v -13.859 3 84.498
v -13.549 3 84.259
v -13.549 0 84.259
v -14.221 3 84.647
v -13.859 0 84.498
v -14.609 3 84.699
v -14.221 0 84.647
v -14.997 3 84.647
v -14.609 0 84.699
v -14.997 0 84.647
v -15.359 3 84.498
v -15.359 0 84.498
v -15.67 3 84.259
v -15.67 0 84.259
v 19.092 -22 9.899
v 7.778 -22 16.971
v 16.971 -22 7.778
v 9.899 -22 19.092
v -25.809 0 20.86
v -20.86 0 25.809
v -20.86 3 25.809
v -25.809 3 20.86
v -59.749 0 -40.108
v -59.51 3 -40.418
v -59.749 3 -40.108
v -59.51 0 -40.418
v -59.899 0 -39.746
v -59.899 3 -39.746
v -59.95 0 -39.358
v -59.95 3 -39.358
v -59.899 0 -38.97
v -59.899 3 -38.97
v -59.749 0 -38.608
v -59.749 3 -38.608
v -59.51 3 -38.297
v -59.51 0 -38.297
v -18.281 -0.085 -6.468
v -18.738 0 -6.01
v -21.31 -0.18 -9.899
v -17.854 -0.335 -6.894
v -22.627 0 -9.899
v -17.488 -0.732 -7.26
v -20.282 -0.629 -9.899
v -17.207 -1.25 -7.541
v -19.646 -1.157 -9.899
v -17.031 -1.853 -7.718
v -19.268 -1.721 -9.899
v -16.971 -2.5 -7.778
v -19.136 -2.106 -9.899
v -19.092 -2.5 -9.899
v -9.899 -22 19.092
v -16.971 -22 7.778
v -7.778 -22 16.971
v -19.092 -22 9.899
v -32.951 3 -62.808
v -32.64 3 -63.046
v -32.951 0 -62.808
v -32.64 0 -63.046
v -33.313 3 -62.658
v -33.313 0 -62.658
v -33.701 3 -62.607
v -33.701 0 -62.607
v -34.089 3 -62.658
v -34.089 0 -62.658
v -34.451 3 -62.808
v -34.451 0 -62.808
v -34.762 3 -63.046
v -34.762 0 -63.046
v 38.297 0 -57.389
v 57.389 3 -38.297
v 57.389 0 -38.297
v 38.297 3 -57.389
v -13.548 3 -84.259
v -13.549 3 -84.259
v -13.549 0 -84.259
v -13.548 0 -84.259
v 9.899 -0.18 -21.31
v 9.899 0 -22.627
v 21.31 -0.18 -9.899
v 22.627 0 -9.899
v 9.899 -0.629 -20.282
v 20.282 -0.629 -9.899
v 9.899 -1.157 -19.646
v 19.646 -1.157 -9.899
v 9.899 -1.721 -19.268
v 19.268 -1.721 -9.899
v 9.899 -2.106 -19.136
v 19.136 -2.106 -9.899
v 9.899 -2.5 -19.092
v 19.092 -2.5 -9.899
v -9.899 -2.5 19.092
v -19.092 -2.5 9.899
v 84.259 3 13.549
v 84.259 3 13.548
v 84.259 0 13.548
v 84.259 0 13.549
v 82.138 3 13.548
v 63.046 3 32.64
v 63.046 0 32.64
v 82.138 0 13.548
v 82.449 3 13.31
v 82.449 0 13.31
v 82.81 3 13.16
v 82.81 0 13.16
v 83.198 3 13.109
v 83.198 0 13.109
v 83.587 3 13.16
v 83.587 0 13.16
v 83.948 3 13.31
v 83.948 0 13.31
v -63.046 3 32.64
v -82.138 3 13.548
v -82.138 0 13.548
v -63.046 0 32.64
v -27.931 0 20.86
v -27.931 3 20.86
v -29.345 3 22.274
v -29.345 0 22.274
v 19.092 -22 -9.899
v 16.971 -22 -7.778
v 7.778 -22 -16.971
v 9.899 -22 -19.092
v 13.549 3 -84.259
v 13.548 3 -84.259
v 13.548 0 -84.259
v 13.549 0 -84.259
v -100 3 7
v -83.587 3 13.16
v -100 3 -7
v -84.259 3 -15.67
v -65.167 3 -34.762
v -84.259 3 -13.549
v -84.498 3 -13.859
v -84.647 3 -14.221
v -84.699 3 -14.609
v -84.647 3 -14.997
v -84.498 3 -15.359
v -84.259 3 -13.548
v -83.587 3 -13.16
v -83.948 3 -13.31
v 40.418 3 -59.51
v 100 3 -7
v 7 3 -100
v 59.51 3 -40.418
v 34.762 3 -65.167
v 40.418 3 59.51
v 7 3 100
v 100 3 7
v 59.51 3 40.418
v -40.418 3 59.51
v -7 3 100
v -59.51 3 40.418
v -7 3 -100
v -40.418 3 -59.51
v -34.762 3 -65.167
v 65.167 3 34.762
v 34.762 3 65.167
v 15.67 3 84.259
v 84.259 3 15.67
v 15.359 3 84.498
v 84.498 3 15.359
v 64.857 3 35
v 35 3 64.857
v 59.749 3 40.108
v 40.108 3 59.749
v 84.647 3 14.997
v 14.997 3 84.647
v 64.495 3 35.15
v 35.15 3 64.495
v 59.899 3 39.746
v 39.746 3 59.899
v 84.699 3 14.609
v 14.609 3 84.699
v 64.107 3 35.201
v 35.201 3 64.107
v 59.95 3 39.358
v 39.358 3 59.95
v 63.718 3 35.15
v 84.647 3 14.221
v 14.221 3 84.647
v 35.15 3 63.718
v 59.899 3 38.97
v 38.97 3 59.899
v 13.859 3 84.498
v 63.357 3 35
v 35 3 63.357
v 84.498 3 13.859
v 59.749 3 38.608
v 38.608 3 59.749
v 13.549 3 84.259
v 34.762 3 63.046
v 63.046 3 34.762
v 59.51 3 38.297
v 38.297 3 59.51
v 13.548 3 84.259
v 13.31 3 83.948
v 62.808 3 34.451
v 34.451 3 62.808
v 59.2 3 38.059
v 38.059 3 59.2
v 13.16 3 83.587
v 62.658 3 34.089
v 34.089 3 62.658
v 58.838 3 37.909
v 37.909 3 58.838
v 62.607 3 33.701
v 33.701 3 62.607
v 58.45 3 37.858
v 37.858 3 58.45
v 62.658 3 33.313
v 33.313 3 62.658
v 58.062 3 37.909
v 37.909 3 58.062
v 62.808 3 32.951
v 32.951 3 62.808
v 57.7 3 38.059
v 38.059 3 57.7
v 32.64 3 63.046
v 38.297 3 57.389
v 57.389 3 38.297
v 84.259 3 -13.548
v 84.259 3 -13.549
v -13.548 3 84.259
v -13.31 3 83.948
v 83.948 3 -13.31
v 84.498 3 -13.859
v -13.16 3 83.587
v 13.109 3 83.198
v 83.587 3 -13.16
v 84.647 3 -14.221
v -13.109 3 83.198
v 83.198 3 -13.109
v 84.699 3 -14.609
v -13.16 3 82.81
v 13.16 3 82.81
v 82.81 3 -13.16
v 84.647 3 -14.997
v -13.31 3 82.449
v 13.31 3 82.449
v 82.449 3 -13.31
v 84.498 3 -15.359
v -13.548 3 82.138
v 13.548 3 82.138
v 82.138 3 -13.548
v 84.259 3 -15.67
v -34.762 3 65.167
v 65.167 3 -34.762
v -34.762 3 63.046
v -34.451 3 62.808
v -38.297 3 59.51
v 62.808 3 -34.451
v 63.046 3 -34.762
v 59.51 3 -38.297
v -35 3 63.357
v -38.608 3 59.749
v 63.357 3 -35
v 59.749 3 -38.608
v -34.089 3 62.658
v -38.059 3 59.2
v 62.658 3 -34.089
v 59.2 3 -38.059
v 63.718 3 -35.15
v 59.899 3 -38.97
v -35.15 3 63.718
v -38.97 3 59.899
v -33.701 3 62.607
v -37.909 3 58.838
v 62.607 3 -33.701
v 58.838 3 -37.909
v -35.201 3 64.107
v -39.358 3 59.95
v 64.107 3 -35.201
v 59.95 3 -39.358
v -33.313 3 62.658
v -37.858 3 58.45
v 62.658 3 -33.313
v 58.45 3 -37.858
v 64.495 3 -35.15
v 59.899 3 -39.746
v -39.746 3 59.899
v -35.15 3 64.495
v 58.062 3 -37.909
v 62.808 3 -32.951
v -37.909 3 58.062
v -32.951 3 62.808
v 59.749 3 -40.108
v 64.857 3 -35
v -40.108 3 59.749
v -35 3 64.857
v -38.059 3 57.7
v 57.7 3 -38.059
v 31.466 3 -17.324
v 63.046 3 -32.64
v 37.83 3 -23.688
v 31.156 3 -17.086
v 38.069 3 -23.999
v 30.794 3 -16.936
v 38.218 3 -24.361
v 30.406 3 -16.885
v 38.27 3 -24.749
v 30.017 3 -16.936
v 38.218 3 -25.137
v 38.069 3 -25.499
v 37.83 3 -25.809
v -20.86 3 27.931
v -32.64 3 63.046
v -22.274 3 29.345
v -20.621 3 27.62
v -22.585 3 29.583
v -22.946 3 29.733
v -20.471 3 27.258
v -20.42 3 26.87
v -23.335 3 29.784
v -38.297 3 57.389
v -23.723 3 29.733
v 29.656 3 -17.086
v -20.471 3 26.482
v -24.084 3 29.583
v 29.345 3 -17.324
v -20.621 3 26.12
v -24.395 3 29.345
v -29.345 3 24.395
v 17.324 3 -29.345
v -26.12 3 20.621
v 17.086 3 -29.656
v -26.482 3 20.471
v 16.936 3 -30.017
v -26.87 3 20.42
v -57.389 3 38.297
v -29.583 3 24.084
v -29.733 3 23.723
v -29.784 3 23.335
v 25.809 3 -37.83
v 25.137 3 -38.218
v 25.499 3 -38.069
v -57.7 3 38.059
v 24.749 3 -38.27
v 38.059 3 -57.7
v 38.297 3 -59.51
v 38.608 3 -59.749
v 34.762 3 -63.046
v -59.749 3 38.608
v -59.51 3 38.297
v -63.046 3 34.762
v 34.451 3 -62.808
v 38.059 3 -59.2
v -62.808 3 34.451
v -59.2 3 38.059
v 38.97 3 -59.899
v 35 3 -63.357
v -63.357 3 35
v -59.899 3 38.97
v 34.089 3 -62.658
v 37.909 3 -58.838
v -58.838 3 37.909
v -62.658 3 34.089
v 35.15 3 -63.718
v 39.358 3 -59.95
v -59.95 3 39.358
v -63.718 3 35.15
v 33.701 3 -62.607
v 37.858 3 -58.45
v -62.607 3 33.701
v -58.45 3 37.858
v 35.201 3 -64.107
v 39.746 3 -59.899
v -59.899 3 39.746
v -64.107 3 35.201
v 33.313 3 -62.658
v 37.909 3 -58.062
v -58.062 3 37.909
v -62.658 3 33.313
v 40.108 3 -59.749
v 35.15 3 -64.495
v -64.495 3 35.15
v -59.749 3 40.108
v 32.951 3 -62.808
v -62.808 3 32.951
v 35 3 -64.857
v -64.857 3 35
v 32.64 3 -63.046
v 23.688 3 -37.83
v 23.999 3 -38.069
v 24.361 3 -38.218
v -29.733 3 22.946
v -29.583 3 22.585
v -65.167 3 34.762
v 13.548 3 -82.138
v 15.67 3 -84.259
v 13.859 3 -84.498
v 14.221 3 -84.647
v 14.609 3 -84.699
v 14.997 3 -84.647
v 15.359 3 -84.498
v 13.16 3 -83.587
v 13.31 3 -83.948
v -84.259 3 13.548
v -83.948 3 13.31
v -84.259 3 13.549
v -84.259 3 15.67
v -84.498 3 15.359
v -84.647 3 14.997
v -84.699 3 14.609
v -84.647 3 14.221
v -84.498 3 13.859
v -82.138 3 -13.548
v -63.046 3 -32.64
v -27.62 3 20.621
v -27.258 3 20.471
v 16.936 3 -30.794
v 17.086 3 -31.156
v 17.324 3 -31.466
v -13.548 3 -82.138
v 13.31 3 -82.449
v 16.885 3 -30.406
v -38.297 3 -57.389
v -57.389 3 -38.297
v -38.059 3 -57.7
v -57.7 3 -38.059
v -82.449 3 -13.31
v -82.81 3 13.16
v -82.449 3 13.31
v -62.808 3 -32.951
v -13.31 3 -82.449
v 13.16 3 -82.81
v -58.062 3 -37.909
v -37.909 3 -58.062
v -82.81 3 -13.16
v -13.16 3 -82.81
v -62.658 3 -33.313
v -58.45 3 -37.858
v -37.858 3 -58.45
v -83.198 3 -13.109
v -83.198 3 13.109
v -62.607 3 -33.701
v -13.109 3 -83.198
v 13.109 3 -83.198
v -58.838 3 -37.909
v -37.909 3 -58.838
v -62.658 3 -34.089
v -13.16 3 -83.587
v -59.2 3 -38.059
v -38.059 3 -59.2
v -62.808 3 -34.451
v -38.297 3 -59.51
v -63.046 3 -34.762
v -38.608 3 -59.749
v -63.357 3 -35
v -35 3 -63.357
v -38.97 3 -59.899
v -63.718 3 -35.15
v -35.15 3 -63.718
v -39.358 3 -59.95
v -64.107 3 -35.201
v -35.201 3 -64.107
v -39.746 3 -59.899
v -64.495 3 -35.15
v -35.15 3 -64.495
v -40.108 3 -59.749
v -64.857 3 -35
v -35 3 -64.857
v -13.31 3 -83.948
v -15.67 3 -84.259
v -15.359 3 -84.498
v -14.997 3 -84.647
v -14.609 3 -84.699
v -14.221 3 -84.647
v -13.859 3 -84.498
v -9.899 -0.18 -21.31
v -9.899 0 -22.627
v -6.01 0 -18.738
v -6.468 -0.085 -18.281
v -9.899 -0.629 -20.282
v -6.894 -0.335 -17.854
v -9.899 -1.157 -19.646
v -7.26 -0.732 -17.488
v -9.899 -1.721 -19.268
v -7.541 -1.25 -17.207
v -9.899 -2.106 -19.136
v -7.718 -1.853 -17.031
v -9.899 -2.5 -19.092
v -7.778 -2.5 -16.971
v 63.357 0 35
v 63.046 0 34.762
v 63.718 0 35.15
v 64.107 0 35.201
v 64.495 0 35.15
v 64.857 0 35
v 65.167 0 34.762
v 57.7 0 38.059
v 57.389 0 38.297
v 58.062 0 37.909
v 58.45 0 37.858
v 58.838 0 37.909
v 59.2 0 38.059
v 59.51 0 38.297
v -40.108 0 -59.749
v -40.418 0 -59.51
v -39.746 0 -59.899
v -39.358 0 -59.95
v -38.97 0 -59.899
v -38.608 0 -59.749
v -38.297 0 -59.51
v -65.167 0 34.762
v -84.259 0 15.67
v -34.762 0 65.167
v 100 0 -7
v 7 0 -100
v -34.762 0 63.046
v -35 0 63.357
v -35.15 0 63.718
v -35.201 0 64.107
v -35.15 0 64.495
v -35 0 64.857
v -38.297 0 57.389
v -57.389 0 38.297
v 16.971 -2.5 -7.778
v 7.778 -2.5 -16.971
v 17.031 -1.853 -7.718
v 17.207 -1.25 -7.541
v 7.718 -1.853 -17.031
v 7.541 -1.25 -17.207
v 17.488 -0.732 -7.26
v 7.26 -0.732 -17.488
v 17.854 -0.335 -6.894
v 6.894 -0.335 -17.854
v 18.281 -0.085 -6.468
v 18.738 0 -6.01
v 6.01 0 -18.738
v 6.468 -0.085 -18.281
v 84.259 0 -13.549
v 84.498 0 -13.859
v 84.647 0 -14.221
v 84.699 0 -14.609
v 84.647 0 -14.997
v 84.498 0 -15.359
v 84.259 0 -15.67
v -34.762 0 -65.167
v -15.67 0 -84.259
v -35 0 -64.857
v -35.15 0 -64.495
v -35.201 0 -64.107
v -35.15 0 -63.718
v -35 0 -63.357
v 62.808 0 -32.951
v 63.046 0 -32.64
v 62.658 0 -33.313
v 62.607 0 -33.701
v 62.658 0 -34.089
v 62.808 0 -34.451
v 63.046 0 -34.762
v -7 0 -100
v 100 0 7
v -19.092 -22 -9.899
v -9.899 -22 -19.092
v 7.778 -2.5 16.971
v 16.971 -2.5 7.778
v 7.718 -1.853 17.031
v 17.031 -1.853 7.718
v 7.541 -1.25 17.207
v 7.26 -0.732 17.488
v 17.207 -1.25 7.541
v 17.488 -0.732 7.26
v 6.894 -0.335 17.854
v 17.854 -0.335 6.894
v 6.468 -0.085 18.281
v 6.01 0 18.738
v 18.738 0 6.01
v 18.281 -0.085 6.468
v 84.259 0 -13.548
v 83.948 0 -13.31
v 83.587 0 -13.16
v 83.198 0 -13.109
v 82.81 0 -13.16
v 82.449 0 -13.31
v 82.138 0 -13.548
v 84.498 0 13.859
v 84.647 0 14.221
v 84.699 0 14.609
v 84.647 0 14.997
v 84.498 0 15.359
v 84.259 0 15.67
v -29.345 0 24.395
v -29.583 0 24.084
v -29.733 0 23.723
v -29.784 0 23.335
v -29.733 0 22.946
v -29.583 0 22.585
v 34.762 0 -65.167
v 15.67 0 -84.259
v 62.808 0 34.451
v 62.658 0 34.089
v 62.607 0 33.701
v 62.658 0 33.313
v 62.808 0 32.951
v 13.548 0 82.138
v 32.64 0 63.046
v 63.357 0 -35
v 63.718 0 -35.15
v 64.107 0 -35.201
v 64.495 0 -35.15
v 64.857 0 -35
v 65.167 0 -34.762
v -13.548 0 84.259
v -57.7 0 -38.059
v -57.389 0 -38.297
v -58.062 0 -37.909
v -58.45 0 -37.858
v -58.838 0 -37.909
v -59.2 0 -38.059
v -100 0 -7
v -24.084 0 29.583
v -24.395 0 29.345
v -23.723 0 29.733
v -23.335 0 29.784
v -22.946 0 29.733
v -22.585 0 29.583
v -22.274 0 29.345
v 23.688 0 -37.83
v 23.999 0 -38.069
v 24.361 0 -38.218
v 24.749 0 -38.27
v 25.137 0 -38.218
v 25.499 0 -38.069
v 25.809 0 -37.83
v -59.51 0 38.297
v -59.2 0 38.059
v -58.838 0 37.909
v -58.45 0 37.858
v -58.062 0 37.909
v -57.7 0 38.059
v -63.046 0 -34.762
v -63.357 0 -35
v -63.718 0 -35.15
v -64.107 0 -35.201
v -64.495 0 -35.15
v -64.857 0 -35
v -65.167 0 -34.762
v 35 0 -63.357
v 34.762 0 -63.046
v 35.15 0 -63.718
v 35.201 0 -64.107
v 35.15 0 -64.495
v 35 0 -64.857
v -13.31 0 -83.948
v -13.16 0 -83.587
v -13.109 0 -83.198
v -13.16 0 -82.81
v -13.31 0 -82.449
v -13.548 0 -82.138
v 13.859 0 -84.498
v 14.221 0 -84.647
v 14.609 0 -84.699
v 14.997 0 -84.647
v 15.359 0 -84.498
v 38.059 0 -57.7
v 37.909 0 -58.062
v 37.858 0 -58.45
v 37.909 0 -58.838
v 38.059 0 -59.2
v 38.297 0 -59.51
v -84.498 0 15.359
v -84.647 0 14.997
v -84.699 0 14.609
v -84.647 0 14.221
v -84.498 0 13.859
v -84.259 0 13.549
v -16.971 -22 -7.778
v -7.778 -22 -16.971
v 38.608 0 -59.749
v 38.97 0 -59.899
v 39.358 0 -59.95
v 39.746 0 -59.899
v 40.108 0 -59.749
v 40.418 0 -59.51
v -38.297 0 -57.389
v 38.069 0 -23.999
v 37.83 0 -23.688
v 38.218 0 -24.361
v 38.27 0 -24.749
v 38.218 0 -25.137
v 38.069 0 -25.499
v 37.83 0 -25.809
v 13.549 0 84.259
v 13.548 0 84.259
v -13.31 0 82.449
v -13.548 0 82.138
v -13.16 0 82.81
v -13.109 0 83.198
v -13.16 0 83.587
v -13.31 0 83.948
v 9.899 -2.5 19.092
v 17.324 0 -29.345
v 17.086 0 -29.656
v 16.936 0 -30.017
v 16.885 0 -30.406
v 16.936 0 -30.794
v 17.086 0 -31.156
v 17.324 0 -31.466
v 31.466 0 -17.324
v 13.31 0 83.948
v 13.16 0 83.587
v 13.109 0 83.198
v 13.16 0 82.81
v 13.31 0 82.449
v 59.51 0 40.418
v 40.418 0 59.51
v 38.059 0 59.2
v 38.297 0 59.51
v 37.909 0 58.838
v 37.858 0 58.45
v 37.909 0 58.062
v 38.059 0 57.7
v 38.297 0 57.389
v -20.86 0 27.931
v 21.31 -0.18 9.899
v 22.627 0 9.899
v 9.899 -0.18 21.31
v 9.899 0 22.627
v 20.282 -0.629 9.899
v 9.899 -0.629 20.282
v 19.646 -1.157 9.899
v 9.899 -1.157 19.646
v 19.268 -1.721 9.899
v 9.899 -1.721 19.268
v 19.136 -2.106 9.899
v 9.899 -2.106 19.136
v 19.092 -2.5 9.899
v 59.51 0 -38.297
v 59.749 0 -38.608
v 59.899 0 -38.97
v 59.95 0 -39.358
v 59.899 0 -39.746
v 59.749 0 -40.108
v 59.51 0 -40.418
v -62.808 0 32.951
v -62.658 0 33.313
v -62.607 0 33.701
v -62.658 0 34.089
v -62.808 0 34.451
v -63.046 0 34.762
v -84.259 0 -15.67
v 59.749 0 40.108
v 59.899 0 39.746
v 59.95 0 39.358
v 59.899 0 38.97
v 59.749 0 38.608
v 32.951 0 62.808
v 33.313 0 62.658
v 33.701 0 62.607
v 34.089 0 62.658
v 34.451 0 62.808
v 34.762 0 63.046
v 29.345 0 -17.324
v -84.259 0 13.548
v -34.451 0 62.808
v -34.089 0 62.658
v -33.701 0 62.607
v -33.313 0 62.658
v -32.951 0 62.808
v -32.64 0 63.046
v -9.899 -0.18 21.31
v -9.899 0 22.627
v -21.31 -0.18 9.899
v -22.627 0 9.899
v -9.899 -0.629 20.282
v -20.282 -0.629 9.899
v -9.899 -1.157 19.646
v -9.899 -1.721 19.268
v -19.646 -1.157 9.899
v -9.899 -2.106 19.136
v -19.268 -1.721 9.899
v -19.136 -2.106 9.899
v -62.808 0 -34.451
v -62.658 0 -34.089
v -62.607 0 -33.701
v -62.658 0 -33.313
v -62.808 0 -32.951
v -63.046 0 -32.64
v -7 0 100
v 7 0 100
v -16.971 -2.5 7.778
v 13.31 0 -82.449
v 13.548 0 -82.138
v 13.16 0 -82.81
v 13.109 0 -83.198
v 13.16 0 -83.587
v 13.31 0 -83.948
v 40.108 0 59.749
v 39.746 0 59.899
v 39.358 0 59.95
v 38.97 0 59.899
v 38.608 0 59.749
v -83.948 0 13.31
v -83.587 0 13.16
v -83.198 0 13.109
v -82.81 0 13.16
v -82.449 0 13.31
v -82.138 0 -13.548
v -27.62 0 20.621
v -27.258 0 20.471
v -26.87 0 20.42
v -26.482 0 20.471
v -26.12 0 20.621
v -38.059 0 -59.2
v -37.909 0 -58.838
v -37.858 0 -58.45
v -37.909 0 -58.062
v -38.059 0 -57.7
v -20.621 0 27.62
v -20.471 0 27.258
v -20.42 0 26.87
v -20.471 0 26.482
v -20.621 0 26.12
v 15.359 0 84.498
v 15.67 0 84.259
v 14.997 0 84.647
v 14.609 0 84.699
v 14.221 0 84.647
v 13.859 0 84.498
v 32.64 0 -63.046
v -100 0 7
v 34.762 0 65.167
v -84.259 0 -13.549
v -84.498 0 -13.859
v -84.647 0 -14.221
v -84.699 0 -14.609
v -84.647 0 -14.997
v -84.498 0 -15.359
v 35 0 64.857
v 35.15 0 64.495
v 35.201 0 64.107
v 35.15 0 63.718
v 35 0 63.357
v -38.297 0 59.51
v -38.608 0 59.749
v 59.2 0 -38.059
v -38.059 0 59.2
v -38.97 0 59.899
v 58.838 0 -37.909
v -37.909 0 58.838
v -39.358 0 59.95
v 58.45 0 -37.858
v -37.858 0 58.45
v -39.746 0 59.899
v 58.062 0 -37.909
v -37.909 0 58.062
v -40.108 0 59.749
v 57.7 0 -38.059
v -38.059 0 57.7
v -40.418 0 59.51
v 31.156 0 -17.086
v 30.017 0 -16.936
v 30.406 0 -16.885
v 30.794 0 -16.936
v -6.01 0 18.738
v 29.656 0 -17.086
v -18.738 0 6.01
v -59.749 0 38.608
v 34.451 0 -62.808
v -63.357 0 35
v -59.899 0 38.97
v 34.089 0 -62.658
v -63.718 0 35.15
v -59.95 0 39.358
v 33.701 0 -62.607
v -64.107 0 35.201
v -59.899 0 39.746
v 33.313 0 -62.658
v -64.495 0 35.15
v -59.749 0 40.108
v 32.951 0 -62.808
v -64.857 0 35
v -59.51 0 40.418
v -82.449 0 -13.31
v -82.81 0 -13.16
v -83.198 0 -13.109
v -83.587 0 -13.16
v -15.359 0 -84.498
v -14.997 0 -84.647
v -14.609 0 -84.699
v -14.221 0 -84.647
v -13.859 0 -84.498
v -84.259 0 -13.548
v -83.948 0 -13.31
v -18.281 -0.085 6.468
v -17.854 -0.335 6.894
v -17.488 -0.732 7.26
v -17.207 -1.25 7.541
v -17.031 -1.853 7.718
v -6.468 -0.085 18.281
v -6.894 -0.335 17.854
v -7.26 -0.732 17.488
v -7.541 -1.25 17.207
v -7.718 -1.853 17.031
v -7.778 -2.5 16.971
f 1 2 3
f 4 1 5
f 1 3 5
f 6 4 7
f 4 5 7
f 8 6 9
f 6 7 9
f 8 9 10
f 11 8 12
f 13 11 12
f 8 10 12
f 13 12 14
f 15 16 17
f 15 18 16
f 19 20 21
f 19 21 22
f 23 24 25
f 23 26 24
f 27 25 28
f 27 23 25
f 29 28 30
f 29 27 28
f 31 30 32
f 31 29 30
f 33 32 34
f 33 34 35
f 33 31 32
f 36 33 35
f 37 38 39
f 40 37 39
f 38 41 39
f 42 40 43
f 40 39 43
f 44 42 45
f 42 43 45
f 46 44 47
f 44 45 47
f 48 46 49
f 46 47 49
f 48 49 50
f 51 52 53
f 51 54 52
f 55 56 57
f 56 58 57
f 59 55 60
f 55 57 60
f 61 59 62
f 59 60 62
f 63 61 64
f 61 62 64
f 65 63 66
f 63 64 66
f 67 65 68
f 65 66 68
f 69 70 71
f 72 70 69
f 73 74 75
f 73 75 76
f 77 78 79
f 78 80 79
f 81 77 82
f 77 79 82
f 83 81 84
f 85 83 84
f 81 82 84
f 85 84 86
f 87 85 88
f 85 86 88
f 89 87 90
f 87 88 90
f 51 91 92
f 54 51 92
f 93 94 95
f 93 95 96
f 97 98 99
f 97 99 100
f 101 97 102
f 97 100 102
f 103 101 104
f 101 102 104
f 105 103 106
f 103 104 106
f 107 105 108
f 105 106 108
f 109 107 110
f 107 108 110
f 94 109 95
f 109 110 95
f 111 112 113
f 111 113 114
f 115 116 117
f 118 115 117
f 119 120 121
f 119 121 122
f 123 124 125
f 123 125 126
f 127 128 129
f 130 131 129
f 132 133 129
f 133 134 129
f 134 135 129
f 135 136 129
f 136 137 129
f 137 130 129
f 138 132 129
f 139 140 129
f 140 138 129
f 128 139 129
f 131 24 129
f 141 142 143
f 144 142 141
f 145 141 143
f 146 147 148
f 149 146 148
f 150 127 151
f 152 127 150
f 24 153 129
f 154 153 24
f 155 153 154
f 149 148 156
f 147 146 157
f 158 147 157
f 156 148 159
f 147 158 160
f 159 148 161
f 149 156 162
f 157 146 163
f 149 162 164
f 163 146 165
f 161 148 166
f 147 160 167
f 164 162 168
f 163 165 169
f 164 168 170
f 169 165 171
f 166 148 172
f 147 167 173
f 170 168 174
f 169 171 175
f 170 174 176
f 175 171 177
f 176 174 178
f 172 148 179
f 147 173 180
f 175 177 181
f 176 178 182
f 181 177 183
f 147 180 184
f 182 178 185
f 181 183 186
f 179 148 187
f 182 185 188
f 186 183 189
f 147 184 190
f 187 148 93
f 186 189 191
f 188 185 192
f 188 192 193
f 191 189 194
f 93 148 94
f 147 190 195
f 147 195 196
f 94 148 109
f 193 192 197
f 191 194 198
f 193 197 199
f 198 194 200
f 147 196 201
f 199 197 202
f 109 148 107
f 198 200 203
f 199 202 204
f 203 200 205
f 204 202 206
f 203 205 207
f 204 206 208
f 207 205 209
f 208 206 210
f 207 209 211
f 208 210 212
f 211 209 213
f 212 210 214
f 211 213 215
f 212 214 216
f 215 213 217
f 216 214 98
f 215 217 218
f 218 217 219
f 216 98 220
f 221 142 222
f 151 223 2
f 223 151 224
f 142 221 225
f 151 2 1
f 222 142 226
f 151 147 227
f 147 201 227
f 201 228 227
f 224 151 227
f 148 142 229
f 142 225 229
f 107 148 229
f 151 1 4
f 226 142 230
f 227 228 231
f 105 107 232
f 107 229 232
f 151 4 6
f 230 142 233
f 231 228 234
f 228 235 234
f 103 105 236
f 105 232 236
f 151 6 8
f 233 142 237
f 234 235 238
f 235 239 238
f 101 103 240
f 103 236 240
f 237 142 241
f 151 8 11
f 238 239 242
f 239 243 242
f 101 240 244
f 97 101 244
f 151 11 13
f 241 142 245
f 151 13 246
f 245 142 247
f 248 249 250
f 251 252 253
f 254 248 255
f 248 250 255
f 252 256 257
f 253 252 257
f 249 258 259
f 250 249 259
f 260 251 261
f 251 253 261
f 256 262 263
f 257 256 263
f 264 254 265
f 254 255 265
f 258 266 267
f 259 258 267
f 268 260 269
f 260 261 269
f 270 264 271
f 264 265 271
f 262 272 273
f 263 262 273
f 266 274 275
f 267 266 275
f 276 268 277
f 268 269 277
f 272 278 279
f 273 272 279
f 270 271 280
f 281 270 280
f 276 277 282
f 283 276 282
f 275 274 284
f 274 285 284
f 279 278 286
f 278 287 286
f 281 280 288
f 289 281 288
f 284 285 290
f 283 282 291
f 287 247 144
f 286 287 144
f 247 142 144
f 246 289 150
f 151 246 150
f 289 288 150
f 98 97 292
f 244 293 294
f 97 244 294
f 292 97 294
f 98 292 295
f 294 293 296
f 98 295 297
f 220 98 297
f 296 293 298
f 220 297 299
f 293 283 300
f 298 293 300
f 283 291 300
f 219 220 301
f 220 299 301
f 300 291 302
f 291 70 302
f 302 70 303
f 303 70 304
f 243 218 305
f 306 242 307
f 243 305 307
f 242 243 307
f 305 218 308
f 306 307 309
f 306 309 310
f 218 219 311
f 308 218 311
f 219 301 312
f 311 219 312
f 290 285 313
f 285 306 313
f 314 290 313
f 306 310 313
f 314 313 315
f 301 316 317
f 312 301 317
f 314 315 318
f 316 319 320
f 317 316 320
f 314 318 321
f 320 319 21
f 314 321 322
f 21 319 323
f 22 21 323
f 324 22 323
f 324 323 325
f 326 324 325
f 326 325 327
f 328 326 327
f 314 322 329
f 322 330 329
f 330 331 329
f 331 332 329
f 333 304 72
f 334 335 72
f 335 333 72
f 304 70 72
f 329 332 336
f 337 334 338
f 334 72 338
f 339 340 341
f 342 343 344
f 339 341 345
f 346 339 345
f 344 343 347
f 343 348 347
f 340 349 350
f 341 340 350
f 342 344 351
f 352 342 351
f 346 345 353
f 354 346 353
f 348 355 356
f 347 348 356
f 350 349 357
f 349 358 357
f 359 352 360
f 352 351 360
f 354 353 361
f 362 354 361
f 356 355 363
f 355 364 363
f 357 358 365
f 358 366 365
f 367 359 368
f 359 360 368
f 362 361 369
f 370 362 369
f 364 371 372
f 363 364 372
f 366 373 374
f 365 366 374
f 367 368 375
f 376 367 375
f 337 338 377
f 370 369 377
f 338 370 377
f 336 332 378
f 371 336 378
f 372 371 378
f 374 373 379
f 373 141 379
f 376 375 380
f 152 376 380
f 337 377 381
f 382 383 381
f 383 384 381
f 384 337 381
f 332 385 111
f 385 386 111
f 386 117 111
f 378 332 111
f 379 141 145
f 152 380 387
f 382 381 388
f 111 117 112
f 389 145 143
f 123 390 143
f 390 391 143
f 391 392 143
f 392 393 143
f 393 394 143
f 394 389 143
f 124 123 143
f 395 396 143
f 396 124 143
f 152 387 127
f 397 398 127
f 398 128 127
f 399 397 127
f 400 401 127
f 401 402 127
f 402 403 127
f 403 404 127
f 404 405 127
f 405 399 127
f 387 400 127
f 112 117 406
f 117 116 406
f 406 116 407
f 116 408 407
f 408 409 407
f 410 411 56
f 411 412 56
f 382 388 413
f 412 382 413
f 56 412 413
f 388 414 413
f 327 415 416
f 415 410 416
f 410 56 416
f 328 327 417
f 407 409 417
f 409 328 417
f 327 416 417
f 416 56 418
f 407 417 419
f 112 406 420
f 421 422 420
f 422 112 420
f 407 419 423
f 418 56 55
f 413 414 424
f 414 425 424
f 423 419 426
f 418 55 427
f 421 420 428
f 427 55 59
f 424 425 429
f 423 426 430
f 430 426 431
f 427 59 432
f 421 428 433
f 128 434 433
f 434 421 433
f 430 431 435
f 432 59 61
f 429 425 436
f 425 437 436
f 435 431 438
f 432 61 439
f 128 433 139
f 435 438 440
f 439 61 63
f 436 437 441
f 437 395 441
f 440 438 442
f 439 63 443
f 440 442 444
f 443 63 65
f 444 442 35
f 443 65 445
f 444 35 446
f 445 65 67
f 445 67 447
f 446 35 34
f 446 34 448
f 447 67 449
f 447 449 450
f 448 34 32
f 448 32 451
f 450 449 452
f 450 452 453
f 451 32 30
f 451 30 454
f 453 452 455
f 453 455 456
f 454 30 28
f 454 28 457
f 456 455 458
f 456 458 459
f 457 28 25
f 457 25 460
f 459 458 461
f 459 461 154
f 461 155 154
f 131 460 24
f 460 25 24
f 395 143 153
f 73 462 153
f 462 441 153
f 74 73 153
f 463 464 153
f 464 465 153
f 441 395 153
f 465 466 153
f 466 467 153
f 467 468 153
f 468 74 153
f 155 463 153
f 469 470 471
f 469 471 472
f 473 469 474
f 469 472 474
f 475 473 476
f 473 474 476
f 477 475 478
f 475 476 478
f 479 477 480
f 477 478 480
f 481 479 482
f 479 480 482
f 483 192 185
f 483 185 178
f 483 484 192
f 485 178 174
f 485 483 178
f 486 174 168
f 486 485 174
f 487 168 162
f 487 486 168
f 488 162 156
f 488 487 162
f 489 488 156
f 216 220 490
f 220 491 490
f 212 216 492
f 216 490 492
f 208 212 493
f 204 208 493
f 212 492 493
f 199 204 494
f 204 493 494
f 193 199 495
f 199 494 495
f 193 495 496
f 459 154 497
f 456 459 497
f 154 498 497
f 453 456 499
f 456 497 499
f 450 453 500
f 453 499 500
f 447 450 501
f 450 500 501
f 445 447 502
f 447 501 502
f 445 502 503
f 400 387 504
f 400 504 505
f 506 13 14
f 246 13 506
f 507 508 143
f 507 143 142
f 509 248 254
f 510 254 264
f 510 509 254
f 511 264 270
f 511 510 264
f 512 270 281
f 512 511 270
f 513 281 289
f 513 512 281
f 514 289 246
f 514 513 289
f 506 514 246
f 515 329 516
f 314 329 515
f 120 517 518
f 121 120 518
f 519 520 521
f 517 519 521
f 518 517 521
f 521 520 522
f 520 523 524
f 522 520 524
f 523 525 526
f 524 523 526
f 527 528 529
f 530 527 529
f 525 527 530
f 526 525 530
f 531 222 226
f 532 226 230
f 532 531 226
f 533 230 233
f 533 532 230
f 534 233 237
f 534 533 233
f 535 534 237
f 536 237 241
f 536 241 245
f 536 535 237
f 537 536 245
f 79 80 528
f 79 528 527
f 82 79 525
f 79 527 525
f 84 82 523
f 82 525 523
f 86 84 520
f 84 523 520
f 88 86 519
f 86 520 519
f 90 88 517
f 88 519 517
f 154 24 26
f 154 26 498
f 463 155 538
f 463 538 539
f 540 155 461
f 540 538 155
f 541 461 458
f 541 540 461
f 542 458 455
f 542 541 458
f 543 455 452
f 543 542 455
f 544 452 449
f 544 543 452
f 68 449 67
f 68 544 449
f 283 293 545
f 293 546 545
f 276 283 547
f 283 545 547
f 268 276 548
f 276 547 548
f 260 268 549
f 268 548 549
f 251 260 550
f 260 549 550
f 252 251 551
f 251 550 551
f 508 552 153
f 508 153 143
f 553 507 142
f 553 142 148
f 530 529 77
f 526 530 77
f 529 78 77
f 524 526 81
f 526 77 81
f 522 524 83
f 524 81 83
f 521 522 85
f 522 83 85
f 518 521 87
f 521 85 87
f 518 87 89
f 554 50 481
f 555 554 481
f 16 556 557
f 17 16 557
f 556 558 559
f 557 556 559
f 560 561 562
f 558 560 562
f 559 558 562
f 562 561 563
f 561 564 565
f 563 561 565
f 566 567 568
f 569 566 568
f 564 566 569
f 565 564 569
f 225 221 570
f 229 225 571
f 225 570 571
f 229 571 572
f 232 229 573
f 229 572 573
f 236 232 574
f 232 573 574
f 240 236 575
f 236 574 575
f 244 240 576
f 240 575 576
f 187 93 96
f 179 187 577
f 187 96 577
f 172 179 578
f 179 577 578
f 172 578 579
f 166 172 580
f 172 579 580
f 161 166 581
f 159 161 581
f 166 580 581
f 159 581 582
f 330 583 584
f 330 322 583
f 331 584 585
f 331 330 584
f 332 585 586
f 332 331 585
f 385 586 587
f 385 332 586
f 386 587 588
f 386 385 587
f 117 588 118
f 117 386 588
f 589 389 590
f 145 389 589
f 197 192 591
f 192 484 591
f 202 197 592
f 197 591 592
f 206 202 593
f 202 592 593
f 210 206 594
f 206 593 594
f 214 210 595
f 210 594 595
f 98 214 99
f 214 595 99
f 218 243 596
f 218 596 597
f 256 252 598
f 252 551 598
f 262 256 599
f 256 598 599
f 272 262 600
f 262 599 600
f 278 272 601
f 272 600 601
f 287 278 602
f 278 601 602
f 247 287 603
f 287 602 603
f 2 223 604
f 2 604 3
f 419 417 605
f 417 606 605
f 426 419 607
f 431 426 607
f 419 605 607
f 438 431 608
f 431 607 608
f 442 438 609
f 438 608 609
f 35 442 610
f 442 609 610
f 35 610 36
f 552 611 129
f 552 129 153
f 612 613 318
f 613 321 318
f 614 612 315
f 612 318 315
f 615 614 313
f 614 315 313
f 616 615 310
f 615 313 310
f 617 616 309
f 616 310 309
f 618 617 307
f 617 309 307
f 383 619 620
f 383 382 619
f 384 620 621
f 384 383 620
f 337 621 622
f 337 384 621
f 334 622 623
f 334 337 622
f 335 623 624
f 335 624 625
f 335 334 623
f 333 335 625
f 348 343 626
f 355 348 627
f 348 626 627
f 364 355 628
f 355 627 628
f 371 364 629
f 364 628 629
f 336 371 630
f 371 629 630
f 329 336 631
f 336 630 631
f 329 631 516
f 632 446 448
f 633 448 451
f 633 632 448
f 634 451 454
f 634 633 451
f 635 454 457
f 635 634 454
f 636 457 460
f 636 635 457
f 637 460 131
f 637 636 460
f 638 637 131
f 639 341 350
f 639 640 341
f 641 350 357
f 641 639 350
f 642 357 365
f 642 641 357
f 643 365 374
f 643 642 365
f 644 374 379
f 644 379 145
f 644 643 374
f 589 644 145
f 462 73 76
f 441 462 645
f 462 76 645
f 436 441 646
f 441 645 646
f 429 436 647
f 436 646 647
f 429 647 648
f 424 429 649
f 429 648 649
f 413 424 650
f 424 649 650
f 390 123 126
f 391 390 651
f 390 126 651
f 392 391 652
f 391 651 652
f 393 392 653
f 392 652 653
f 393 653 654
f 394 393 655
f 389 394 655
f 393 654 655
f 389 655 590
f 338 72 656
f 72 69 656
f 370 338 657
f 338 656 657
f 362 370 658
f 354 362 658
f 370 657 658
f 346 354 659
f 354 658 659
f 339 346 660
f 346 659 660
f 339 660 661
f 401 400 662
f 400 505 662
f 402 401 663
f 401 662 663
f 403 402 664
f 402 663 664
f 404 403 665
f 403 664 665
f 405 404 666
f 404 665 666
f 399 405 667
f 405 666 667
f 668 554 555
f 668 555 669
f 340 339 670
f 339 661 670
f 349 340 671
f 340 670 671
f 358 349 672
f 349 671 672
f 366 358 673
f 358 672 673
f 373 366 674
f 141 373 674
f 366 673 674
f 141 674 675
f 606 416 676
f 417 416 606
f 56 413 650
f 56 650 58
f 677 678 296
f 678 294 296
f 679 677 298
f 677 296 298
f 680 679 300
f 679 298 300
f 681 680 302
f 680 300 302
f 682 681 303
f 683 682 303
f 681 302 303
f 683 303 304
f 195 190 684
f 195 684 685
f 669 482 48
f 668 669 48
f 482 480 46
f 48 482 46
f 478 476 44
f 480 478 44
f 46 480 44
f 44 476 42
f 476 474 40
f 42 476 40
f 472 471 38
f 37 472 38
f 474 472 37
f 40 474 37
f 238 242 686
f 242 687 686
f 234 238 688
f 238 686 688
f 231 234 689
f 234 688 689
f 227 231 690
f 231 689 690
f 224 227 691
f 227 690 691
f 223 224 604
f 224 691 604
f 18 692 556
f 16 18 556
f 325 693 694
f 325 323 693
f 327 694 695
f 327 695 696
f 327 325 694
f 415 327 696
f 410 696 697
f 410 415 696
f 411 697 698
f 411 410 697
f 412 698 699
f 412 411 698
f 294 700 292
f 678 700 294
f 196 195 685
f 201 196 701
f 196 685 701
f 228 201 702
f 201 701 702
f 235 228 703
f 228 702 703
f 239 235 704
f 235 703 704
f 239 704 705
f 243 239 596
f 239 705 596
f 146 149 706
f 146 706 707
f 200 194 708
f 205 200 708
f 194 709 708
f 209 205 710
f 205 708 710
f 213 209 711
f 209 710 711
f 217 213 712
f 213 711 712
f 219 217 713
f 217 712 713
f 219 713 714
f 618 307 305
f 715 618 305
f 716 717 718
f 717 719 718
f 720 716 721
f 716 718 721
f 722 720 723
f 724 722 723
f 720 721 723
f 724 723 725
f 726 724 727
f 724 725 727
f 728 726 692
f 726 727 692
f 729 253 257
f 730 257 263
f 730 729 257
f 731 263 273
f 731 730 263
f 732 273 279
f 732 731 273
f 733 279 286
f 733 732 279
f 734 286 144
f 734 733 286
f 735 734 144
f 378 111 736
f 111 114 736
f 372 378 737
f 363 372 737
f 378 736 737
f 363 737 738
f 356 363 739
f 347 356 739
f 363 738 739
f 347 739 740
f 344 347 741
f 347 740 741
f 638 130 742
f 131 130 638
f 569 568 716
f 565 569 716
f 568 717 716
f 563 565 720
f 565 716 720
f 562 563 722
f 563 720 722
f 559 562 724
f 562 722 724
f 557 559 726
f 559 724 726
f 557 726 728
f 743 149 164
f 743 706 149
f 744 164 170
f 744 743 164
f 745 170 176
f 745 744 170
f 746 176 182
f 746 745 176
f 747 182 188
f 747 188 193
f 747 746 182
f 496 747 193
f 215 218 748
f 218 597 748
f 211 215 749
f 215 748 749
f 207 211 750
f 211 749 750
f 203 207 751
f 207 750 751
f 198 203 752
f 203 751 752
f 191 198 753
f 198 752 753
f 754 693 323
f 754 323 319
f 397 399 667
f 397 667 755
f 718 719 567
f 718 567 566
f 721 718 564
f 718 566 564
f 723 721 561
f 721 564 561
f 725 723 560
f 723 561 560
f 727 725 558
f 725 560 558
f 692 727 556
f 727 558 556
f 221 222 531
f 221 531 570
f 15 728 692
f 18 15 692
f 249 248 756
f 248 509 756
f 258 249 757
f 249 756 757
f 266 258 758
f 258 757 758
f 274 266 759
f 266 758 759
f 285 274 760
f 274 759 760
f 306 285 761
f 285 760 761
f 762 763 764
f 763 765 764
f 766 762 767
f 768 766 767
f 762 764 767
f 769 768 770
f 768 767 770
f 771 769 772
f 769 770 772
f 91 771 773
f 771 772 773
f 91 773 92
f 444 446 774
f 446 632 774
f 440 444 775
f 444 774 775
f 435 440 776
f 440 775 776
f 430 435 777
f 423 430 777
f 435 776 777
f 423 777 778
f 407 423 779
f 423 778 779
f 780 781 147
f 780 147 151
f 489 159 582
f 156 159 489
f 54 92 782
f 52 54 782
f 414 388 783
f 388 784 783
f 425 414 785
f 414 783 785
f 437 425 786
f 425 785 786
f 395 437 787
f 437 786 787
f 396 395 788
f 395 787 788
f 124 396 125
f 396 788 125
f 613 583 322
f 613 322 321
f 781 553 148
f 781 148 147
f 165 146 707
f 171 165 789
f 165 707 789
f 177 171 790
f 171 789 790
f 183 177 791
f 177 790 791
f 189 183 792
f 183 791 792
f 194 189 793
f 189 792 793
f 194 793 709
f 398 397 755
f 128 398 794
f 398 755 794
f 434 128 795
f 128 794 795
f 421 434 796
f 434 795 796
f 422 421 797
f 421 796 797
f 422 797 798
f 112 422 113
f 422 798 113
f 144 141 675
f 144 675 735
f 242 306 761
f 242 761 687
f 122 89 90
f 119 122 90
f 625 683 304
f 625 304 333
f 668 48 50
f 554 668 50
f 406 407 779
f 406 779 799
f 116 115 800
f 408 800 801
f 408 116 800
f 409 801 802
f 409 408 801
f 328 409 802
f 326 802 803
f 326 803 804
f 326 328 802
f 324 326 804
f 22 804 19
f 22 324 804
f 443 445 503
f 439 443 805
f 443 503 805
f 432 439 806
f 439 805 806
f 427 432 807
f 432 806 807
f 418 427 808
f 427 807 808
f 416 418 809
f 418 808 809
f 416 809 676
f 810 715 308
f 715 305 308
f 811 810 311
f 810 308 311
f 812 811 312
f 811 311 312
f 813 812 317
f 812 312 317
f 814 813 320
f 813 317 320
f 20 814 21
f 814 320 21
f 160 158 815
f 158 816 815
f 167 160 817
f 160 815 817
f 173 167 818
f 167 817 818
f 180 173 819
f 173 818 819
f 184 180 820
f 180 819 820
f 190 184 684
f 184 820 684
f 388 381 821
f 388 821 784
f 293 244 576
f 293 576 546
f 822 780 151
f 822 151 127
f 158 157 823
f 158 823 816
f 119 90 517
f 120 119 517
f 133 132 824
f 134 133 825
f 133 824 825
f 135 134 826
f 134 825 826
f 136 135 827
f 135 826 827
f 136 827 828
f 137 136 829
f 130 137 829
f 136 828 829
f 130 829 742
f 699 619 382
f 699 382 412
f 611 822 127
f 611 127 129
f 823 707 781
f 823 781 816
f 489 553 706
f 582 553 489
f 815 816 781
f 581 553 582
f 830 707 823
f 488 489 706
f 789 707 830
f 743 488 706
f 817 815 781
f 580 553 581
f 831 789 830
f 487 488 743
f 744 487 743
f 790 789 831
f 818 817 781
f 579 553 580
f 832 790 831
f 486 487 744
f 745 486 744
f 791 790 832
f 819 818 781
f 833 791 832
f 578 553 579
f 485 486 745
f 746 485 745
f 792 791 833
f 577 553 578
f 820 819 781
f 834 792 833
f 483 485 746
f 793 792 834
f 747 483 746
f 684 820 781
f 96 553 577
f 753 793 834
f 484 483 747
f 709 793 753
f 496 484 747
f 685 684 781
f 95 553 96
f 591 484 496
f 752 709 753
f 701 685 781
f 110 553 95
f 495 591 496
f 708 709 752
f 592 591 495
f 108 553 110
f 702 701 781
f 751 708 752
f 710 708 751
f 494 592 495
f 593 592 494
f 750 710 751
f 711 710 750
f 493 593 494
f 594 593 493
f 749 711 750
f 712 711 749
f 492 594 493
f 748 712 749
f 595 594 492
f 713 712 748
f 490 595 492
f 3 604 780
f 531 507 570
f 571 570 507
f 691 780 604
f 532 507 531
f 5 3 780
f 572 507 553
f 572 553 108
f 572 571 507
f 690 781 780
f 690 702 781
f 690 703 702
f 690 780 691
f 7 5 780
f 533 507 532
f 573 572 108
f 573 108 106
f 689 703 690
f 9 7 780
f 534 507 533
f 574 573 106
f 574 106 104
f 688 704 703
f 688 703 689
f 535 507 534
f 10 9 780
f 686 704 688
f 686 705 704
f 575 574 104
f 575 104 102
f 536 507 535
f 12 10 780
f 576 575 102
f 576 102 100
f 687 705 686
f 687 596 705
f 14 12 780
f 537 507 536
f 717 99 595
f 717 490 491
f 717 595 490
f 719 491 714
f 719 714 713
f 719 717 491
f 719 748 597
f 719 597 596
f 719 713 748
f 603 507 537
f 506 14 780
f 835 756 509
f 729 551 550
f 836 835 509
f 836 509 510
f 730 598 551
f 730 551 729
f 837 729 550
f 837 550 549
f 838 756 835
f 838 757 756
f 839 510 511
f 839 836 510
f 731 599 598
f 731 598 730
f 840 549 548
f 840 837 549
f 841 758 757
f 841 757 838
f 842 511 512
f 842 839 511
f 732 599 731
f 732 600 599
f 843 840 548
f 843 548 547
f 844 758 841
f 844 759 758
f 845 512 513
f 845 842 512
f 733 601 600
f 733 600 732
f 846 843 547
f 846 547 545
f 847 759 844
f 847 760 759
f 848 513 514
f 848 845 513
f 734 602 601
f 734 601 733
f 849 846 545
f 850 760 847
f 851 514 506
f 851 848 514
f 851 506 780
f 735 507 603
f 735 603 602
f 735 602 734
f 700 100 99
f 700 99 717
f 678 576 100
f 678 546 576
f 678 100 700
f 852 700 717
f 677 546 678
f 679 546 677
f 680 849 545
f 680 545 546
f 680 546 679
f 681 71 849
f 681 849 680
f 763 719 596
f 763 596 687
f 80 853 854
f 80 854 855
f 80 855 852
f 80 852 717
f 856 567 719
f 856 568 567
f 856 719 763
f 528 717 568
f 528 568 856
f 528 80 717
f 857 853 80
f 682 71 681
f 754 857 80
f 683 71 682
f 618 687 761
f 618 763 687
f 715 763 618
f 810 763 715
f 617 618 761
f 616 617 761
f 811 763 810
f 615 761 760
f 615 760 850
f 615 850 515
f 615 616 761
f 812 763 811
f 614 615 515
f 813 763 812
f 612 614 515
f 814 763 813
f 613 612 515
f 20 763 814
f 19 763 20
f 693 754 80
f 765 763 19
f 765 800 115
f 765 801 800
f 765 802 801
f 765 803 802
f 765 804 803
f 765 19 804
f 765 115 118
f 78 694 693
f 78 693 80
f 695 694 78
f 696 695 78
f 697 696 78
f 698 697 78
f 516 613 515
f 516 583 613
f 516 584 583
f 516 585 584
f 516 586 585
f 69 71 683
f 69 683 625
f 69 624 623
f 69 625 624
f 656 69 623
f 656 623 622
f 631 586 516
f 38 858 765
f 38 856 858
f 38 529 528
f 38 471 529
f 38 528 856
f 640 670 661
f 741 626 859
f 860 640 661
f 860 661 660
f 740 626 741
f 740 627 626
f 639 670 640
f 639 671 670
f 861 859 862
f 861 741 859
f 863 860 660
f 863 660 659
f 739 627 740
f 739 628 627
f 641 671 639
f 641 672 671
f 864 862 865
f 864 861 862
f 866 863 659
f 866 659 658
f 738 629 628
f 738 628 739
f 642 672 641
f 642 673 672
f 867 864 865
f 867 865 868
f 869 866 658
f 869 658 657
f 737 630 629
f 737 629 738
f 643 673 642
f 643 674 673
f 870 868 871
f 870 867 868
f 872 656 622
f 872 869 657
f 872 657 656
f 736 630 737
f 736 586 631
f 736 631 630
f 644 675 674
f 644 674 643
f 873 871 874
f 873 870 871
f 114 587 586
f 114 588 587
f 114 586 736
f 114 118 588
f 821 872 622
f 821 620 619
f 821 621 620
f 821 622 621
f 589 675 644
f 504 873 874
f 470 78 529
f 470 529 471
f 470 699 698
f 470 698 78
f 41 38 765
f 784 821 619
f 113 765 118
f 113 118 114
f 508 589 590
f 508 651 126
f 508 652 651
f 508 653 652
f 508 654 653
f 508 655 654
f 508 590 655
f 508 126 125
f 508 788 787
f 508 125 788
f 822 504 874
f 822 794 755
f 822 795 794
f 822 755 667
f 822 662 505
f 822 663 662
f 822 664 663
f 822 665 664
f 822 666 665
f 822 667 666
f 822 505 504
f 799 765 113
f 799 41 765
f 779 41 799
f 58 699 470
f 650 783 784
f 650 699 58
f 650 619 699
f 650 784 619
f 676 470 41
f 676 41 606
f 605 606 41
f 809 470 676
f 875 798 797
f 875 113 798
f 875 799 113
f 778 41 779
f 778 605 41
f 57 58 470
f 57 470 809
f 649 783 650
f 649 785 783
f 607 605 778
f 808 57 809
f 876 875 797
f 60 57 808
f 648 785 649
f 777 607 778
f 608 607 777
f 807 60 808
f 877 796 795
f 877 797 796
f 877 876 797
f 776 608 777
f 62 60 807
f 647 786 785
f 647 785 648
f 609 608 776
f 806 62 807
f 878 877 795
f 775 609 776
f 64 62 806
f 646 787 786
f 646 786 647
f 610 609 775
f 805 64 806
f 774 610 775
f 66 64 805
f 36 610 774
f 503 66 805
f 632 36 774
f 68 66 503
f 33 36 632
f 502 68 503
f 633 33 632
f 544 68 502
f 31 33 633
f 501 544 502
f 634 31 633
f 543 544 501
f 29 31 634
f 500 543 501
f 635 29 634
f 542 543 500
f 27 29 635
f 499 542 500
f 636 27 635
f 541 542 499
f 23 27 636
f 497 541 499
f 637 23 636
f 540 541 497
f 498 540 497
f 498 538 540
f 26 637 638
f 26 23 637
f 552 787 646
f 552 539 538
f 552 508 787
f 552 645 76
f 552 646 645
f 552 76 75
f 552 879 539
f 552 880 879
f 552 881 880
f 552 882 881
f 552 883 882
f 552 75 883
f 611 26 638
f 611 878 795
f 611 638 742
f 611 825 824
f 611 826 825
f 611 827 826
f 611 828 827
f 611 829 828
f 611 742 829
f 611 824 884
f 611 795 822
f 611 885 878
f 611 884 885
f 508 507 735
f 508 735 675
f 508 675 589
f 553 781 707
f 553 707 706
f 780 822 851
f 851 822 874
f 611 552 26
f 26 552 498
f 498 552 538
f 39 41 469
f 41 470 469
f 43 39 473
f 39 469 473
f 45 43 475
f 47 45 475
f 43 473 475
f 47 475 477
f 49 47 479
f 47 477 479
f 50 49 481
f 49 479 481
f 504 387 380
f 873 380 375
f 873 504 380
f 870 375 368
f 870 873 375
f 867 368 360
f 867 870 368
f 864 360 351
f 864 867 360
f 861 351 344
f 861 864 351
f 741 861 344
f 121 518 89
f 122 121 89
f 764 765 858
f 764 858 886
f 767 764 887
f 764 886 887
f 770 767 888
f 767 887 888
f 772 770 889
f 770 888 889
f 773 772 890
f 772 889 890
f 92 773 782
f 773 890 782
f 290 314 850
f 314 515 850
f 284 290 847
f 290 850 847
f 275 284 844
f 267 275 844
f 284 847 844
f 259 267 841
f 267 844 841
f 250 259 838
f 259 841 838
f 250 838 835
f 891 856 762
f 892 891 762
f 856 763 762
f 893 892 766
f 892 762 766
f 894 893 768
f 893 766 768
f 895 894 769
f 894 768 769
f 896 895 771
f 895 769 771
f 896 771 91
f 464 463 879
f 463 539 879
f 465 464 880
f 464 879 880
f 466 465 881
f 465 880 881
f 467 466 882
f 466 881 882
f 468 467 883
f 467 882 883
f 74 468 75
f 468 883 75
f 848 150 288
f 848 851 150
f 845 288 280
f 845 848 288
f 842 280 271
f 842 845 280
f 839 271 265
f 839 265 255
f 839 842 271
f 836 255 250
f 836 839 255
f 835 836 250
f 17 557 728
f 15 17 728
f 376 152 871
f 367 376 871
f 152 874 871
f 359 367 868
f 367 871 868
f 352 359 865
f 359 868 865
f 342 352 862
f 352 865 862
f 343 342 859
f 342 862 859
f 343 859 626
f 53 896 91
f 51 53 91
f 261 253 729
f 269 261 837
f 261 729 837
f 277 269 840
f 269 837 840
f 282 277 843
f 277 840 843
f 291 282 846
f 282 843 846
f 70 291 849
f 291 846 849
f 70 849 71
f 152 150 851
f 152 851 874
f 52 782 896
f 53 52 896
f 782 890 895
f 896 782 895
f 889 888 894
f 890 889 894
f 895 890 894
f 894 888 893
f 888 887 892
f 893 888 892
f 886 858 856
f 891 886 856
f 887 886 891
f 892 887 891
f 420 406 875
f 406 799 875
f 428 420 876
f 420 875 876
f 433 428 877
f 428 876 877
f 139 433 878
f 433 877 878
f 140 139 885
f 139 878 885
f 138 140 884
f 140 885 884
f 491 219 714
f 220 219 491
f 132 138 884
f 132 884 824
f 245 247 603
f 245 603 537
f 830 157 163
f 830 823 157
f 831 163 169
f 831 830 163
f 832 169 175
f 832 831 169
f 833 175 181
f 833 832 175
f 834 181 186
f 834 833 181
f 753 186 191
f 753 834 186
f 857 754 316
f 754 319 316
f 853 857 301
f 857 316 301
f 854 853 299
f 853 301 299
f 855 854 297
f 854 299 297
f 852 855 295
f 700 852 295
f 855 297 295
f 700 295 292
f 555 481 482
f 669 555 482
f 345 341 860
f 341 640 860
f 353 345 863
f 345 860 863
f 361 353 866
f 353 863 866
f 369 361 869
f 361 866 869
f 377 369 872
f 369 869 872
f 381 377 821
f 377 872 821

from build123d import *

# Parameters (mm, degrees)
MAIN_PLATE_DEPTH               = 3
BOTTOM_PLATE_CONNECTORS_DEPTH  = 22
REMOVE_STRESS_CONCENTRATIONS_R = 2.5
WIRE_HOLES_DEPTH               = 144.122325303
CUT_EXTRUDE1_DEPTH             = 144.614066163
FILLET1_R                      = 1.5


with BuildPart() as part:
    # Sketch1 → Main Plate (new body)
    with BuildSketch(Plane(origin=(0, 0, 0), x_dir=(1, 0, 0), z_dir=(0, 1, 0))):
        Polygon((-7, 100), (7, 100), (100, 7), (100, -7), (7, -100), (-7, -100), (-100, -7), (-100, 7), align=None)
    extrude(amount=MAIN_PLATE_DEPTH)

    # Sketch2 → Bottom Plate Connectors (add)
    with BuildSketch(Plane.XZ):
        Polygon((7.778174593, 16.970562748), (16.970562748, 7.778174593), (19.091883092, 9.899494937), (9.899494937, 19.091883092), align=None)
        Polygon((16.970562748, -7.778174593), (7.778174593, -16.970562748), (9.899494937, -19.091883092), (19.091883092, -9.899494937), align=None)
        Polygon((-7.778174593, -16.970562748), (-16.970562748, -7.778174593), (-19.091883092, -9.899494937), (-9.899494937, -19.091883092), align=None)
        Polygon((-16.970562748, 7.778174593), (-7.778174593, 16.970562748), (-9.899494937, 19.091883092), (-19.091883092, 9.899494937), align=None)
    extrude(amount=BOTTOM_PLATE_CONNECTORS_DEPTH)

    # Remove Stress Concentrations
    remove_stress_concentrations_edges = [part.edges().sort_by_distance(p)[0] for p in [
        (8.838834765, 0, 18.03122292),
        (18.03122292, 0, 8.838834765),
        (14.495689014, 0, 14.495689014),
        (18.03122292, 0, -8.838834765),
        (8.838834765, 0, -18.03122292),
        (14.495689014, 0, -14.495689014),
        (-8.838834765, 0, -18.03122292),
        (-18.03122292, 0, -8.838834765),
        (-14.495689014, 0, -14.495689014),
        (-18.03122292, 0, 8.838834765),
        (-8.838834765, 0, 18.03122292),
        (-14.495689014, 0, 14.495689014),
    ]]
    fillet(remove_stress_concentrations_edges, radius=REMOVE_STRESS_CONCENTRATIONS_R)

    # Sketch3 → Wire Holes (cut, through all)
    with BuildSketch(Plane.XZ):
        Polygon((30.405591591, -16.263455967), (38.890872965, -24.748737342), (24.748737342, -38.890872965), (16.263455967, -30.405591591), align=None)
        Polygon((-23.334523779, 30.405591591), (-19.798989873, 26.870057685), (-26.870057685, 19.798989873), (-30.405591591, 23.334523779), align=None)
    extrude(amount=-WIRE_HOLES_DEPTH, mode=Mode.SUBTRACT)

    # Sketch4 → Cut-Extrude1 (cut, through all)
    with BuildSketch(Plane(origin=(0, 3, 0), x_dir=(1, 0, 0), z_dir=(0, 1, 0))):
        Polygon((14.609127035, 85.319805153), (35.82233047, 64.106601718), (33.701010127, 61.985281374), (12.487806691, 83.19848481), align=None)
        Polygon((39.357864376, 60.571067812), (60.571067812, 39.357864376), (58.449747468, 37.236544033), (37.236544033, 58.449747468), align=None)
        Polygon((64.106601718, 35.82233047), (85.319805153, 14.609127035), (83.19848481, 12.487806691), (61.985281374, 33.701010127), align=None)
        Polygon((85.319805153, -14.609127035), (64.106601718, -35.82233047), (61.985281374, -33.701010127), (83.19848481, -12.487806691), align=None)
        Polygon((58.449747468, -37.236544033), (60.571067812, -39.357864376), (39.357864376, -60.571067812), (37.236544033, -58.449747468), align=None)
        Polygon((33.701010127, -61.985281374), (35.82233047, -64.106601718), (14.609127035, -85.319805153), (12.487806691, -83.19848481), align=None)
        Polygon((-14.609127035, -85.319805153), (-35.82233047, -64.106601718), (-33.701010127, -61.985281374), (-12.487806691, -83.19848481), align=None)
        Polygon((-37.236544033, -58.449747468), (-39.357864376, -60.571067812), (-60.571067812, -39.357864376), (-58.449747468, -37.236544033), align=None)
        Polygon((-61.985281374, -33.701010127), (-64.106601718, -35.82233047), (-85.319805153, -14.609127035), (-83.19848481, -12.487806691), align=None)
        Polygon((-85.319805153, 14.609127035), (-64.106601718, 35.82233047), (-61.985281374, 33.701010127), (-83.19848481, 12.487806691), align=None)
        Polygon((-58.449747468, 37.236544033), (-60.571067812, 39.357864376), (-39.357864376, 60.571067812), (-37.236544033, 58.449747468), align=None)
        Polygon((-33.701010127, 61.985281374), (-35.82233047, 64.106601718), (-14.609127035, 85.319805153), (-12.487806691, 83.19848481), align=None)
    extrude(amount=-CUT_EXTRUDE1_DEPTH, mode=Mode.SUBTRACT)

    # Fillet1
    fillet1_edges = [part.edges().sort_by_distance(p)[0] for p in [
        (16.263455967, 1.5, -30.405591591),
        (24.748737342, 1.5, -38.890872965),
        (30.405591591, 1.5, -16.263455967),
        (38.890872965, 1.5, -24.748737342),
        (-23.334523779, 1.5, 30.405591591),
        (-19.798989873, 1.5, 26.870057685),
        (-30.405591591, 1.5, 23.334523779),
        (-26.870057685, 1.5, 19.798989873),
        (-33.701010127, 1.5, 61.985281374),
        (-58.449747468, 1.5, 37.236544033),
        (-83.19848481, 1.5, 12.487806691),
        (-64.106601718, 1.5, -35.82233047),
        (-39.357864376, 1.5, -60.571067812),
        (-14.609127035, 1.5, -85.319805153),
        (14.609127035, 1.5, -85.319805153),
        (33.701010127, 1.5, 61.985281374),
        (58.449747468, 1.5, 37.236544033),
        (83.19848481, 1.5, 12.487806691),
        (39.357864376, 1.5, -60.571067812),
        (64.106601718, 1.5, -35.82233047),
        (-39.357864376, 1.5, 60.571067812),
        (-64.106601718, 1.5, 35.82233047),
        (-83.19848481, 1.5, -12.487806691),
        (-58.449747468, 1.5, -37.236544033),
        (-33.701010127, 1.5, -61.985281374),
        (33.701010127, 1.5, -61.985281374),
        (58.449747468, 1.5, -37.236544033),
        (83.19848481, 1.5, -12.487806691),
        (64.106601718, 1.5, 35.82233047),
        (-14.609127035, 1.5, 85.319805153),
        (39.357864376, 1.5, 60.571067812),
        (14.609127035, 1.5, 85.319805153),
        (-85.319805153, 1.5, 14.609127035),
        (-85.319805153, 1.5, -14.609127035),
        (-60.571067812, 1.5, -39.357864376),
        (-35.82233047, 1.5, -64.106601718),
        (-60.571067812, 1.5, 39.357864376),
        (-35.82233047, 1.5, 64.106601718),
        (12.487806691, 1.5, 83.19848481),
        (12.487806691, 1.5, -83.19848481),
        (-12.487806691, 1.5, 83.19848481),
        (-37.236544033, 1.5, 58.449747468),
        (-61.985281374, 1.5, 33.701010127),
        (-61.985281374, 1.5, -33.701010127),
        (-37.236544033, 1.5, -58.449747468),
        (-12.487806691, 1.5, -83.19848481),
        (35.82233047, 1.5, -64.106601718),
        (60.571067812, 1.5, -39.357864376),
        (85.319805153, 1.5, -14.609127035),
        (35.82233047, 1.5, 64.106601718),
        (60.571067812, 1.5, 39.357864376),
        (85.319805153, 1.5, 14.609127035),
        (37.236544033, 1.5, 58.449747468),
        (61.985281374, 1.5, 33.701010127),
        (37.236544033, 1.5, -58.449747468),
        (61.985281374, 1.5, -33.701010127),
    ]]
    fillet(fillet1_edges, radius=FILLET1_R - 0.0001)  # a hair under: the kernel refuses the full size


solid = part.part
